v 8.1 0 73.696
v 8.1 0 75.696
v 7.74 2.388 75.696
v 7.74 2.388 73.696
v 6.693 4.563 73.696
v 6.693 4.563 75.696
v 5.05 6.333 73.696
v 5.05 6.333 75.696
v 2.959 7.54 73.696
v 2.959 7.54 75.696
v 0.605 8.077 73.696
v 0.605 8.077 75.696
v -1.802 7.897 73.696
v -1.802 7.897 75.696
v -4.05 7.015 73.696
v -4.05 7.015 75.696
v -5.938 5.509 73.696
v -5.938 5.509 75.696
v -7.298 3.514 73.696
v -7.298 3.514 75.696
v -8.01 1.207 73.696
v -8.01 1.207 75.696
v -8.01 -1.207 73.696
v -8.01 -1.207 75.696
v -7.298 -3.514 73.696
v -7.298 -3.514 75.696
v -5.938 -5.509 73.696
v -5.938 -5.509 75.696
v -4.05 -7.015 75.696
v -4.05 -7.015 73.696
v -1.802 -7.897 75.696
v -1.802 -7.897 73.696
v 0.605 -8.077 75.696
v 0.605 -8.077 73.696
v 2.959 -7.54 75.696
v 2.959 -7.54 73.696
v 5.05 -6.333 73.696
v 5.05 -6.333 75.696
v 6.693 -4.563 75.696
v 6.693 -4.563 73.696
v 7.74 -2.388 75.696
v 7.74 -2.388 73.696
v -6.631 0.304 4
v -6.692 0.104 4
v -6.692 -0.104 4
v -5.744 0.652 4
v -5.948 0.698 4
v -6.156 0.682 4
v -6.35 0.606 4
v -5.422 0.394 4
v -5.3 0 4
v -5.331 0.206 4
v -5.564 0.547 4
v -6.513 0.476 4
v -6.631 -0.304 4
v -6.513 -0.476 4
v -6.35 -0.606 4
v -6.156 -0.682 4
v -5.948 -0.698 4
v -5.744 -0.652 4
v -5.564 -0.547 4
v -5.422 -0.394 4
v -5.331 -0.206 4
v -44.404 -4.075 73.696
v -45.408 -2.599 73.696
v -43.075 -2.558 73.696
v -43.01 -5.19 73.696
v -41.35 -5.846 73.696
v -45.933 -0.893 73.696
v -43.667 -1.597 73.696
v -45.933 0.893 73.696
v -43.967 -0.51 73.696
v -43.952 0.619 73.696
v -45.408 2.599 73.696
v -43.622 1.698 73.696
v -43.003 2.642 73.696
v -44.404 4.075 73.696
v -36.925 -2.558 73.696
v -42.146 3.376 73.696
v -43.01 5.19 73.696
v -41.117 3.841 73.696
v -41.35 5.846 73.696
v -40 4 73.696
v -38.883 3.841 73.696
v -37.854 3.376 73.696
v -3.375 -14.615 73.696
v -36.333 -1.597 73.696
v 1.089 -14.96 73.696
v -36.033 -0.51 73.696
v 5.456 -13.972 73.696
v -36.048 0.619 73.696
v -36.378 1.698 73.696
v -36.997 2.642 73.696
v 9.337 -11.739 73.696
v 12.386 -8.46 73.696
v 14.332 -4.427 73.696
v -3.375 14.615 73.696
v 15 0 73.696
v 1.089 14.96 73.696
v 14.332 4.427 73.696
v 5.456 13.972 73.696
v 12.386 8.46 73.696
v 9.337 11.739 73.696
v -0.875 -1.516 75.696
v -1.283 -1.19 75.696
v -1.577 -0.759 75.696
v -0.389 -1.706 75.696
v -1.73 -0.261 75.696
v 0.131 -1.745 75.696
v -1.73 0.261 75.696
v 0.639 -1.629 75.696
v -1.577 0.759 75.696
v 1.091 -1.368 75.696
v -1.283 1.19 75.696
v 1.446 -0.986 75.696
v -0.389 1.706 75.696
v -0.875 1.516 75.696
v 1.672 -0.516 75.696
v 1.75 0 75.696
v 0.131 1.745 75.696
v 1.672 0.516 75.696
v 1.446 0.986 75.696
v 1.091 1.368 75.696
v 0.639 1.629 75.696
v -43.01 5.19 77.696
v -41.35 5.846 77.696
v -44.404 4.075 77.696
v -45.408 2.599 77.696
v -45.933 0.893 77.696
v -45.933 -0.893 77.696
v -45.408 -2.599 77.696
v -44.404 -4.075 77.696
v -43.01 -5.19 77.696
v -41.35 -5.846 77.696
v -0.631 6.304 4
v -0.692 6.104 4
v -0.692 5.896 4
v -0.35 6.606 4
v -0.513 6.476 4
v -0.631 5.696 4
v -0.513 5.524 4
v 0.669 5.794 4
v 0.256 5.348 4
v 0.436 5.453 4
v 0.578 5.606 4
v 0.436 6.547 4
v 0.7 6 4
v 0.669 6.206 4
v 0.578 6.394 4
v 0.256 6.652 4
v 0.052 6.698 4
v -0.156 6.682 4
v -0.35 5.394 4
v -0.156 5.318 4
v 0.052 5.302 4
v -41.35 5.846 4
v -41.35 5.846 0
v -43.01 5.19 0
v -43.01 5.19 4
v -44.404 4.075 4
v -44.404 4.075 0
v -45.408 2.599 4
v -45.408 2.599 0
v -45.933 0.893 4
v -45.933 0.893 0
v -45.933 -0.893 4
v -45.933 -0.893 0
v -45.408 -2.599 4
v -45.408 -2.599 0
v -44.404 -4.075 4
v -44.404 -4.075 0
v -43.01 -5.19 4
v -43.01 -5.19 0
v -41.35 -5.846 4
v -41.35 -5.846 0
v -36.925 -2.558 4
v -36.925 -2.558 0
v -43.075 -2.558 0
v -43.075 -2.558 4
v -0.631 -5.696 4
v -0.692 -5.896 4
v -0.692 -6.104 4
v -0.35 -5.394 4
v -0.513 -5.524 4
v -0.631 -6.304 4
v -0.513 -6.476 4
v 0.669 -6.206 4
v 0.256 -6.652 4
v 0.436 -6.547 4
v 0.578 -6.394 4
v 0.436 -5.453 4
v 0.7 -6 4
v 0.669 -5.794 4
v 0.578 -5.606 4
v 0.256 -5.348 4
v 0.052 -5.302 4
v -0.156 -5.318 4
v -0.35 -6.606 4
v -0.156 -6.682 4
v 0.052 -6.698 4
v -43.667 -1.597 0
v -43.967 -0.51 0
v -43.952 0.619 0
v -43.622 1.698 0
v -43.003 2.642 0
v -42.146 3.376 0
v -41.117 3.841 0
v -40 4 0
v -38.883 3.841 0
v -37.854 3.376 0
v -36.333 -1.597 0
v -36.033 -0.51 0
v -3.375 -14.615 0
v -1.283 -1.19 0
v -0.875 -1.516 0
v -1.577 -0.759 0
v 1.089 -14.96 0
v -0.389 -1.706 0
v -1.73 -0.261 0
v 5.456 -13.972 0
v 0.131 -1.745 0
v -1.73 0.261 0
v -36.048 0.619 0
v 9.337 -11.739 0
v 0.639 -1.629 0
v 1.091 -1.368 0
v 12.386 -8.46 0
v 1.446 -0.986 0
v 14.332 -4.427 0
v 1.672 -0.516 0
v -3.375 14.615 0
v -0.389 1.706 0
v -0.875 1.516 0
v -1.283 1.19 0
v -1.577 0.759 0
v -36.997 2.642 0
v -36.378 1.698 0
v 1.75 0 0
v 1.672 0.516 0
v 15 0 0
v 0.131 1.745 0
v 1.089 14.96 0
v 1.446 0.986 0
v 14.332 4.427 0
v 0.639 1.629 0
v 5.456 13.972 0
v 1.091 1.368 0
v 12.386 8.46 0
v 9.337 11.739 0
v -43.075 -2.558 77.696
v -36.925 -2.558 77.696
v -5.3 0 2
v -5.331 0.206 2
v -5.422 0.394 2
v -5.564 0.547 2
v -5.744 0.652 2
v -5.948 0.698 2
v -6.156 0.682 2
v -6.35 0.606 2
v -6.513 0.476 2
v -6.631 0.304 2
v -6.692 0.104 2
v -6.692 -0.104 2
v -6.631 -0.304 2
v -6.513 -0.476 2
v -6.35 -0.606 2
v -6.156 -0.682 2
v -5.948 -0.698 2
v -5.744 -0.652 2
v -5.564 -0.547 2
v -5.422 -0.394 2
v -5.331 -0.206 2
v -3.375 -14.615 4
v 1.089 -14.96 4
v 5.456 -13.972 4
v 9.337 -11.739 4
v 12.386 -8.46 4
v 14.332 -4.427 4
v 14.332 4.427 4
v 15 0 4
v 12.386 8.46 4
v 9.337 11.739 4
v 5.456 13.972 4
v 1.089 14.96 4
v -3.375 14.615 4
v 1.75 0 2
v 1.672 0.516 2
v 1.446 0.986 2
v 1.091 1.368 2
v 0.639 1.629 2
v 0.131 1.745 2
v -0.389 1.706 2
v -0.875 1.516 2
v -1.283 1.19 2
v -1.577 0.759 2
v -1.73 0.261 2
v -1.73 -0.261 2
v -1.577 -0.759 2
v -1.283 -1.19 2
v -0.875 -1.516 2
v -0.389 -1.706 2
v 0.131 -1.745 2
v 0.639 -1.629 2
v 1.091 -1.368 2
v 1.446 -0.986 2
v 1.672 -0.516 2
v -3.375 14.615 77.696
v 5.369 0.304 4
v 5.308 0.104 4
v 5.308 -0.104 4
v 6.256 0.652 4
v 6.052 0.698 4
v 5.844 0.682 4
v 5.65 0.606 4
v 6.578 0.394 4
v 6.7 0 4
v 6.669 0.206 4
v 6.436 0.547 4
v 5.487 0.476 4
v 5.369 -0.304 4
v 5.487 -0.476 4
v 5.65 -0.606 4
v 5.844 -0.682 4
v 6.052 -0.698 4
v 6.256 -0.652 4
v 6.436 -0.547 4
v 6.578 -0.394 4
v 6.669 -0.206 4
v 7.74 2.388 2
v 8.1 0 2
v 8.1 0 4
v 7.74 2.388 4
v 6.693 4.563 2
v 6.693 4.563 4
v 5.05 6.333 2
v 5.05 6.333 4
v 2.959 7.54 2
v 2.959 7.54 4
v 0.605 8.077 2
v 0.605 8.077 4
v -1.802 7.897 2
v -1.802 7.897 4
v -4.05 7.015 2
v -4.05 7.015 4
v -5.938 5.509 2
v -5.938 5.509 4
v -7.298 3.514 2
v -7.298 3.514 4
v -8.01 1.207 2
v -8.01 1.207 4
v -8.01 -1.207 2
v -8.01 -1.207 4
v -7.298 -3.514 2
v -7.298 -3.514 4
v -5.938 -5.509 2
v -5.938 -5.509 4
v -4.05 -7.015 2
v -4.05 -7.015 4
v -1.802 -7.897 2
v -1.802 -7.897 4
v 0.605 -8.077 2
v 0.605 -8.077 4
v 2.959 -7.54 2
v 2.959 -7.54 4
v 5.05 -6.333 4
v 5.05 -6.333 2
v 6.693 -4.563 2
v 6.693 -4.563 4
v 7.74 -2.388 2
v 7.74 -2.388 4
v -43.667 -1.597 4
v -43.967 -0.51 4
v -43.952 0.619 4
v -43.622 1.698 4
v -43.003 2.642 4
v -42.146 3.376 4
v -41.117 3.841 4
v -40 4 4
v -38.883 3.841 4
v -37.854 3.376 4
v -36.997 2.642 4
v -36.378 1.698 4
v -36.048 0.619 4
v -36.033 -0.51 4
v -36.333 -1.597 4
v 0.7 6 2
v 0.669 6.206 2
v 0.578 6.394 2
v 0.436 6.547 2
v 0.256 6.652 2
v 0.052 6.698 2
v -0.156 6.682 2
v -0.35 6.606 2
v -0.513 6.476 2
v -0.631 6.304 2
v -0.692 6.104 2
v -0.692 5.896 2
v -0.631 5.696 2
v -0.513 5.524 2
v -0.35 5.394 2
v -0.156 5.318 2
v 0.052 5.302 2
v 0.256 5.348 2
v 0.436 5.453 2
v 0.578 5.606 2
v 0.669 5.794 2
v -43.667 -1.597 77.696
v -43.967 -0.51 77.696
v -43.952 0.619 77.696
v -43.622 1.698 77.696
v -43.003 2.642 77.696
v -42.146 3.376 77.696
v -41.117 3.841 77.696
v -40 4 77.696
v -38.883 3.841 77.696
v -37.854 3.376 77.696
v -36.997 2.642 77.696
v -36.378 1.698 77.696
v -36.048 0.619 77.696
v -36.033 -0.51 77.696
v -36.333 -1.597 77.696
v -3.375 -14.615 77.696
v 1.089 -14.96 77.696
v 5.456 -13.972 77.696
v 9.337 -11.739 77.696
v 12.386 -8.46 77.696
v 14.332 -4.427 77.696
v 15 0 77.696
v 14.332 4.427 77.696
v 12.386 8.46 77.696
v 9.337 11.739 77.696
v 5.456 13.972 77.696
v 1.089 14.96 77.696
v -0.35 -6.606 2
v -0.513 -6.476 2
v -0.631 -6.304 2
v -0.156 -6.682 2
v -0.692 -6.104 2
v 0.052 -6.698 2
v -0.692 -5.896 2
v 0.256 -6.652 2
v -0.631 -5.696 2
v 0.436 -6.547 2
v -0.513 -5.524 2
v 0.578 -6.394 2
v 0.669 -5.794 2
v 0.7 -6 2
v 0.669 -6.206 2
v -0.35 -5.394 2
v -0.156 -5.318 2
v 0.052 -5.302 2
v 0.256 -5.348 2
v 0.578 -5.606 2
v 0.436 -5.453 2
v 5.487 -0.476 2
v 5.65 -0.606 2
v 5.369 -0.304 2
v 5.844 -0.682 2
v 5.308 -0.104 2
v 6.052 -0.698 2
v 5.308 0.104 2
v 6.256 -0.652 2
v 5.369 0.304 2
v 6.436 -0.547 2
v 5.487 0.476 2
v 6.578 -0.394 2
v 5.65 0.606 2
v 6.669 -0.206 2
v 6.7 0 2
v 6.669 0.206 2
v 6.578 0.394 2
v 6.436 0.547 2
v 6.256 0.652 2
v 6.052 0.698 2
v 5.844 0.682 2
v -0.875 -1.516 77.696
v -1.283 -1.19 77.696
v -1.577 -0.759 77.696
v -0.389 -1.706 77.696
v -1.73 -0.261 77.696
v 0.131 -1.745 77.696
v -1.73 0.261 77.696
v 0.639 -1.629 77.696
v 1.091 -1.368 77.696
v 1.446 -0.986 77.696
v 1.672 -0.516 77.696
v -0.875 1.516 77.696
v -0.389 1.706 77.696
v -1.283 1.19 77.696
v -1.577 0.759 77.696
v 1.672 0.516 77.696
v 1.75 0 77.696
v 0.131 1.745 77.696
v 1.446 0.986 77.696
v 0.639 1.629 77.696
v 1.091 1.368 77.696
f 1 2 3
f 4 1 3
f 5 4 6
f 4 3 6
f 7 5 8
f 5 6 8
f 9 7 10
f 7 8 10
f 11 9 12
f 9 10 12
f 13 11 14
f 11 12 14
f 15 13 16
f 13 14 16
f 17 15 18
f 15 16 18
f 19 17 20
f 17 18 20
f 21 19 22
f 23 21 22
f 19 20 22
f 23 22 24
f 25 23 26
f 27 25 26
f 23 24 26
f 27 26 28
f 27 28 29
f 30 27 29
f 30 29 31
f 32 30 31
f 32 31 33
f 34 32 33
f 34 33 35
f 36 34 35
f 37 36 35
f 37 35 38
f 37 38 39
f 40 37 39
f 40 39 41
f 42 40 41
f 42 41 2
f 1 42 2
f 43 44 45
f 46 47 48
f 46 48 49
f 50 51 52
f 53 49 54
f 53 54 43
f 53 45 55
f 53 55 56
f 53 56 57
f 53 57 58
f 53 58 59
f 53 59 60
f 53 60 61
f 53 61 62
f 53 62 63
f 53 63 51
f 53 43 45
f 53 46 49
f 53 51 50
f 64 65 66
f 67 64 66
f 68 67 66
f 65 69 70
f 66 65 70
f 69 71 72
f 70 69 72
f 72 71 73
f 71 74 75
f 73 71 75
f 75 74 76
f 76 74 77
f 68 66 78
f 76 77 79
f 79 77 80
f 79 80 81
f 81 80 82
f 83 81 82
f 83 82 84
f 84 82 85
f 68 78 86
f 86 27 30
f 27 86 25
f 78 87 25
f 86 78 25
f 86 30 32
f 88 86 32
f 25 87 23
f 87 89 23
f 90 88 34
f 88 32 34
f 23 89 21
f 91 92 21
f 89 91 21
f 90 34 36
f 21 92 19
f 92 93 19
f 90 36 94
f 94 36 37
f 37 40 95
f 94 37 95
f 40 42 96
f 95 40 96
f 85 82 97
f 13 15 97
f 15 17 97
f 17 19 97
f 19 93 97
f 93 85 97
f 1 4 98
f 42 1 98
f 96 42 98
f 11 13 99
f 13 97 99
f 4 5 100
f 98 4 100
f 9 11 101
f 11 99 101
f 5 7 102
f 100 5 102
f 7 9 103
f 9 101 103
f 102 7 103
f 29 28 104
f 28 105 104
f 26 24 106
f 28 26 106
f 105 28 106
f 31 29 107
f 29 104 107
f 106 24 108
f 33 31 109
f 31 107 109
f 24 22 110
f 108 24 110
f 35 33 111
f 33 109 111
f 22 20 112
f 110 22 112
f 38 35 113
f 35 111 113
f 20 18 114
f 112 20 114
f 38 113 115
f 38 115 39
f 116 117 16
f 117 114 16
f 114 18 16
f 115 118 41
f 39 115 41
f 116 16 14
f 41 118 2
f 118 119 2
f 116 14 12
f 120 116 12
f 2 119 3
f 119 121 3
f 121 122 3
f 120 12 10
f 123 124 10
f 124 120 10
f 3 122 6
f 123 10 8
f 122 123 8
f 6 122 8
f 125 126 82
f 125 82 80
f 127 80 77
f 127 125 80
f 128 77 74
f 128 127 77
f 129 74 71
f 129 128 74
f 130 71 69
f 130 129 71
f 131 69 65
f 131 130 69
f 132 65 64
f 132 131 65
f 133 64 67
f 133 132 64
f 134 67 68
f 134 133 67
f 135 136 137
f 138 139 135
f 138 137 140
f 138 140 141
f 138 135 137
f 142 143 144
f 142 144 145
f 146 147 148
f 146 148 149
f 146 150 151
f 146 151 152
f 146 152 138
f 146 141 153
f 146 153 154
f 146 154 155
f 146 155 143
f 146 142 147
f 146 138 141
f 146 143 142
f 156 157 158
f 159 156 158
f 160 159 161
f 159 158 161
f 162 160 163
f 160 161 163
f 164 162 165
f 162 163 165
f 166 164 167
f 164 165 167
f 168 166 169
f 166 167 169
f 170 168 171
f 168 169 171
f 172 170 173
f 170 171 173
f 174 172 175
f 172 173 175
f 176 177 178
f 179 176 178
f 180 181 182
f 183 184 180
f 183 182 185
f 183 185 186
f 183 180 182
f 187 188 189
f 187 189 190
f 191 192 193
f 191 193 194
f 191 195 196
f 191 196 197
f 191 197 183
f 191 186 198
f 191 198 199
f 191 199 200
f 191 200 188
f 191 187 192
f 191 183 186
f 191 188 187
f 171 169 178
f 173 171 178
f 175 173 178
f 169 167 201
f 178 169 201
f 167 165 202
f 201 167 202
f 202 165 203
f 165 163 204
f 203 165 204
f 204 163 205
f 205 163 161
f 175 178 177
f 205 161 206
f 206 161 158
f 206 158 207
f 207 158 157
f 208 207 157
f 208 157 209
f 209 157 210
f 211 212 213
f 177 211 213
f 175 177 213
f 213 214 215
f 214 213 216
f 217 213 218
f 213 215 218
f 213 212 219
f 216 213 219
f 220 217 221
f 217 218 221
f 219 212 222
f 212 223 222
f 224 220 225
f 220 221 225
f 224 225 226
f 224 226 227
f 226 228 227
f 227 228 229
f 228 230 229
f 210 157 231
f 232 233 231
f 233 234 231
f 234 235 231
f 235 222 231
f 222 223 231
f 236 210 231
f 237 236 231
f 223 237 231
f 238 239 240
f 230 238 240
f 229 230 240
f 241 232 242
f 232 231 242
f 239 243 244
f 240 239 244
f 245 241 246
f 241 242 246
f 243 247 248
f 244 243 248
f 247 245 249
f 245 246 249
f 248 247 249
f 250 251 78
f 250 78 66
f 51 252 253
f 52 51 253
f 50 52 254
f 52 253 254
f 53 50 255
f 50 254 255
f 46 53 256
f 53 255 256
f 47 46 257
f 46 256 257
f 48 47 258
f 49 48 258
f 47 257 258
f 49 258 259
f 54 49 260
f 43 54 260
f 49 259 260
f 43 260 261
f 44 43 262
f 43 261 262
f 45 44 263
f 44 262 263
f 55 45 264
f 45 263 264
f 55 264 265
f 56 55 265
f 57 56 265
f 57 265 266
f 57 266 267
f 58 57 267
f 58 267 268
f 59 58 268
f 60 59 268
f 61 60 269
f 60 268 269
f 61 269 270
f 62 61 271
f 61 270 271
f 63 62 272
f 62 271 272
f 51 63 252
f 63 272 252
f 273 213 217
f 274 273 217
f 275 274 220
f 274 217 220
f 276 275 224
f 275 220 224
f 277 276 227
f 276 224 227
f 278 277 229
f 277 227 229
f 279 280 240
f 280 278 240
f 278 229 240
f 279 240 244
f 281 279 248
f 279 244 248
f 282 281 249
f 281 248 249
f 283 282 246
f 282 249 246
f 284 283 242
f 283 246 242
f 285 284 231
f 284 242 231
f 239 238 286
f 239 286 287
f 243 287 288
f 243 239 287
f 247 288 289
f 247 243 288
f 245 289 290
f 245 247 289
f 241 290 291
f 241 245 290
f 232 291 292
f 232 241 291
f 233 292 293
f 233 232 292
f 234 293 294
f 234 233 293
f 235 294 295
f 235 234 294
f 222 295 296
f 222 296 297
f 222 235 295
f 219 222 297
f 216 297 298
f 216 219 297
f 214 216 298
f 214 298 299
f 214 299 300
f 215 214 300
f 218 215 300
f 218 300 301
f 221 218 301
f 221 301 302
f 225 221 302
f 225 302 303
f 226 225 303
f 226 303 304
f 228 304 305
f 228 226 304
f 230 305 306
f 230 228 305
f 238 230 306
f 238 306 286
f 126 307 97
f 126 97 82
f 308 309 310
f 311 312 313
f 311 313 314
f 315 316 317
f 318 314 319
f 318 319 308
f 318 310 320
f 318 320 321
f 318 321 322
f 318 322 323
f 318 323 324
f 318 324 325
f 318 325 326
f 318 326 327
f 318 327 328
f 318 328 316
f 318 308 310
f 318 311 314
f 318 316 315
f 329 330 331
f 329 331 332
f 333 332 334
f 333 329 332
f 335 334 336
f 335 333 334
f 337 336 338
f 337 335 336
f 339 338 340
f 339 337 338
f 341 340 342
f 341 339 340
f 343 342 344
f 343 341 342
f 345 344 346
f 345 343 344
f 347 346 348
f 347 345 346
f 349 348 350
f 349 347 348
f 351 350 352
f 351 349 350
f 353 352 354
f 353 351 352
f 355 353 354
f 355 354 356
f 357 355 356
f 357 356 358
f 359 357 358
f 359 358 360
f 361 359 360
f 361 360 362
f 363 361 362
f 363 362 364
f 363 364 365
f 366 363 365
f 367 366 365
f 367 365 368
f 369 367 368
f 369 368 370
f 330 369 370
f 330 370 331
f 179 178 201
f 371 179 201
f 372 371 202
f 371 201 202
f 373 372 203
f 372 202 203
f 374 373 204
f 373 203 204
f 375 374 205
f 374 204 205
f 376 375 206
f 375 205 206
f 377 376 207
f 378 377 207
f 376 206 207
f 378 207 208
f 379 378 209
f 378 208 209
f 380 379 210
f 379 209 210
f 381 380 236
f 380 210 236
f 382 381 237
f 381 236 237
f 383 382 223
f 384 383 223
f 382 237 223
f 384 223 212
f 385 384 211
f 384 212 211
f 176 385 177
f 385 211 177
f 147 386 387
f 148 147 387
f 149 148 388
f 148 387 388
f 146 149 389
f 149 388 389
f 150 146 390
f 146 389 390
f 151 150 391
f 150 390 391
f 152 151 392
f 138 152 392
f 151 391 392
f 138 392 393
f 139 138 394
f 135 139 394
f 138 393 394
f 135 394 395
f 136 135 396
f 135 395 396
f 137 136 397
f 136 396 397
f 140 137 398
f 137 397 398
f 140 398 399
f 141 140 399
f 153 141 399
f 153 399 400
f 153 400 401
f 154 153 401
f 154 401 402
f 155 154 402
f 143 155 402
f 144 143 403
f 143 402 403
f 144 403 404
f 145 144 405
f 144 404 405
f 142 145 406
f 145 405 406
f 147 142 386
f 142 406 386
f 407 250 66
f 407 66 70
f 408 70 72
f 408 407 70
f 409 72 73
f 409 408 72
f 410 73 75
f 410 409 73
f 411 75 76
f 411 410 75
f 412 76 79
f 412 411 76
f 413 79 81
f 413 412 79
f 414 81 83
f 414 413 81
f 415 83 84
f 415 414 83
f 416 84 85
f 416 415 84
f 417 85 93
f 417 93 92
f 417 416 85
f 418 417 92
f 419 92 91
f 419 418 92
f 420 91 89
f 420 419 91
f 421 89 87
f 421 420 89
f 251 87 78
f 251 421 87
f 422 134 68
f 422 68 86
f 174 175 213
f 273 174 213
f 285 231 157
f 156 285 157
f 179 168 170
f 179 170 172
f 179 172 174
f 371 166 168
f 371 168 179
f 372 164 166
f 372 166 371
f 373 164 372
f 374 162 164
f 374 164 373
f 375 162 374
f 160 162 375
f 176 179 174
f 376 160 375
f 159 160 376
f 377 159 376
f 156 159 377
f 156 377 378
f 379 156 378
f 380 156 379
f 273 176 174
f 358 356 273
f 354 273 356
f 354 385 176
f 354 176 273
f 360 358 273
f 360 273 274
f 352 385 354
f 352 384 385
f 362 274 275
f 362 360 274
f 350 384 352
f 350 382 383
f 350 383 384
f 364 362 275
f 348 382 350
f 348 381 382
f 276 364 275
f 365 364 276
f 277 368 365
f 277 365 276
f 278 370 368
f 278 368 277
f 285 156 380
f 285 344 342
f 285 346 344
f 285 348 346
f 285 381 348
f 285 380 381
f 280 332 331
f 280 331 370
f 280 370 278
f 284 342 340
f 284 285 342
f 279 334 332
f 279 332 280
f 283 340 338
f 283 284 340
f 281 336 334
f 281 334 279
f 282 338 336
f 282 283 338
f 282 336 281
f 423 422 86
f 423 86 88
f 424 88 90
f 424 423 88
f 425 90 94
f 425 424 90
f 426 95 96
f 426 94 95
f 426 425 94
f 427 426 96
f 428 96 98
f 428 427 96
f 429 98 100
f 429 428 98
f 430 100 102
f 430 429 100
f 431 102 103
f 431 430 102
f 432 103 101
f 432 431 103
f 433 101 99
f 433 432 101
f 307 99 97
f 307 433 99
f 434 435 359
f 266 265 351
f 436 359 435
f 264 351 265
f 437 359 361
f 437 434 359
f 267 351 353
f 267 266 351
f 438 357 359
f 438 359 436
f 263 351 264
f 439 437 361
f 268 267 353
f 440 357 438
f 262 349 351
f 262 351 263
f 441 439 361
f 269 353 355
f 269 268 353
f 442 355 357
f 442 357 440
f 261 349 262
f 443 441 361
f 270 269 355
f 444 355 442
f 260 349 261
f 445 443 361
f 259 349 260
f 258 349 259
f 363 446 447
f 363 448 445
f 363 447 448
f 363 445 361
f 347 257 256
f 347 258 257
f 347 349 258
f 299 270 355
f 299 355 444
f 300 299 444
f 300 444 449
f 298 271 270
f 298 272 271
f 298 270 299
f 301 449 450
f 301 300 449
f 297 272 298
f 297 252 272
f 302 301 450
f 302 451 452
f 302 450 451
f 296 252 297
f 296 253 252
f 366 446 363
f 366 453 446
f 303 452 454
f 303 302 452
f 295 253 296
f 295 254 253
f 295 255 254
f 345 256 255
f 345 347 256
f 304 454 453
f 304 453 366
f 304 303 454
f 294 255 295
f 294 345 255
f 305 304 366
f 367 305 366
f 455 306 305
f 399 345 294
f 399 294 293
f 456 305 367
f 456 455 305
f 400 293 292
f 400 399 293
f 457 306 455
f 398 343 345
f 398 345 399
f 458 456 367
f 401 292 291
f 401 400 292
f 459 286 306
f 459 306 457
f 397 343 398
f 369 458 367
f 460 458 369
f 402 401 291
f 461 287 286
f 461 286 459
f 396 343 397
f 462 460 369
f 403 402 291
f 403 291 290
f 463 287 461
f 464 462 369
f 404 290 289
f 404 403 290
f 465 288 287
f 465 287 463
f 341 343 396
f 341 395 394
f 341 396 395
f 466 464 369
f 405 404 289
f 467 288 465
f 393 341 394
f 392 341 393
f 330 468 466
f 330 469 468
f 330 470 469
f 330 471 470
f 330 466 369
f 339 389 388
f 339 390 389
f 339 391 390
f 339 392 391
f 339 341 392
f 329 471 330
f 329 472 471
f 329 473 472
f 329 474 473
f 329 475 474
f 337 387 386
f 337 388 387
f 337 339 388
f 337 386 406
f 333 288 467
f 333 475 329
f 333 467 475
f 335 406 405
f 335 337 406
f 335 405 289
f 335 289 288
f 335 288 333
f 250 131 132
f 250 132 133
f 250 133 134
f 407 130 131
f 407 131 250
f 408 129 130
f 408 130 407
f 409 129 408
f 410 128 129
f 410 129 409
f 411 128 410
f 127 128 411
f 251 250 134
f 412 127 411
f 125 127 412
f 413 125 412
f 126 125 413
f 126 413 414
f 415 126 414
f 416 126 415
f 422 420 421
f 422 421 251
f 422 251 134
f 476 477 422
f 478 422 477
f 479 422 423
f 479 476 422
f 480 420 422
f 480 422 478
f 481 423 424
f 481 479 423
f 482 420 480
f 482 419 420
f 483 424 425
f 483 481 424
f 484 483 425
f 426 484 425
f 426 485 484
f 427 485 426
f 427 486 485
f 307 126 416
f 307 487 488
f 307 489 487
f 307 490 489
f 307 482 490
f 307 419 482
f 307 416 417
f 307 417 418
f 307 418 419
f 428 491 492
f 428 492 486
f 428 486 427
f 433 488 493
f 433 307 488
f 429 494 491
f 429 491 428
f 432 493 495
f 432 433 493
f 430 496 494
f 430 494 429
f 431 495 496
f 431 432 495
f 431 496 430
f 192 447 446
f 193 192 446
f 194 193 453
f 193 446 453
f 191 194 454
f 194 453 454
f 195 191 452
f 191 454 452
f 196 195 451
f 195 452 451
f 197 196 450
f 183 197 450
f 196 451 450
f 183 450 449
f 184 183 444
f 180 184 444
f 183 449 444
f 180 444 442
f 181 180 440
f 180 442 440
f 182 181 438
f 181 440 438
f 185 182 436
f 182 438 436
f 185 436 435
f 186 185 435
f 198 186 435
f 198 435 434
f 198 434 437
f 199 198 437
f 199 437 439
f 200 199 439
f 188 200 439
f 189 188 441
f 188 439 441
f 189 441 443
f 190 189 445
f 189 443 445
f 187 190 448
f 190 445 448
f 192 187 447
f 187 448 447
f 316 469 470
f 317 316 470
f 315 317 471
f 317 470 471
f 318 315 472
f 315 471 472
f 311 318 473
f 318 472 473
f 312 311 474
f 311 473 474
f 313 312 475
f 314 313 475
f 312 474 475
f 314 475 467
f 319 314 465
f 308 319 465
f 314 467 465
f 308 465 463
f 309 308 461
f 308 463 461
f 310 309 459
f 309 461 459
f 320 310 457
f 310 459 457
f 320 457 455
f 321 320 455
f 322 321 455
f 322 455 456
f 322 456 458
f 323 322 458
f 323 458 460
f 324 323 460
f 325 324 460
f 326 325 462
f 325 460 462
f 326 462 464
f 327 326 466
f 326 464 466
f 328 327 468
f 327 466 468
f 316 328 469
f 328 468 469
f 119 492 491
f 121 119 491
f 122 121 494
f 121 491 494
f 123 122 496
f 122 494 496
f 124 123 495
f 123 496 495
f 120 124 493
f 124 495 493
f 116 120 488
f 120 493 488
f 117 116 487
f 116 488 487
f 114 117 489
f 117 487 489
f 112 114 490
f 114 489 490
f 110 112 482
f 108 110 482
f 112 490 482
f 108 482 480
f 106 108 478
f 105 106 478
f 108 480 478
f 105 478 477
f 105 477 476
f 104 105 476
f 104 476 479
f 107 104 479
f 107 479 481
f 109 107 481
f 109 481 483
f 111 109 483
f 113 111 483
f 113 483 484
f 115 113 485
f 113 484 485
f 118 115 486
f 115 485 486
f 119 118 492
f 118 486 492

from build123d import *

# Parameters (mm, degrees)
SKETCH1_R           = 15
SKETCH1_R_2         = 8.1
BOSS_EXTRUDE1_DEPTH = 4
SKETCH1_3_R         = 8.1
SKETCH1_3_R_2       = 1.75
BOSS_EXTRUDE2_DEPTH = 2
BOSS_EXTRUDE3_DEPTH = 4
SKETCH3_R           = 0.7
BOSS_EXTRUDE4_DEPTH = 2


with BuildPart() as part:
    # Sketch1 → Boss-Extrude1 (new body)
    with BuildSketch(Plane.XY):
        Circle(SKETCH1_R)
        Circle(SKETCH1_R_2, mode=Mode.SUBTRACT)
    extrude(amount=BOSS_EXTRUDE1_DEPTH)

    # Sketch1<3> → Boss-Extrude2 (add)
    with BuildSketch(Plane.XY):
        Circle(SKETCH1_3_R)
        Circle(SKETCH1_3_R_2, mode=Mode.SUBTRACT)
    extrude(amount=BOSS_EXTRUDE2_DEPTH)

    # Sketch2 → Boss-Extrude3 (add)
    with BuildSketch(Plane.XY):
        with BuildLine():
            Line((-3.375, 14.615381452), (-41.35, 5.846152581))
            ThreePointArc((-41.35, 5.846152581), (-46, 0), (-41.35, -5.846152581))
            Line((-41.35, -5.846152581), (-3.375, -14.615381452))
            ThreePointArc((-3.375, -14.615381452), (-15, 0), (-3.375, 14.615381452))
        make_face()
        with BuildLine():
            Line((-36.925, -2.558197608), (-43.075, -2.558197608))
            ThreePointArc((-43.075, -2.558197608), (-40, 4), (-36.925, -2.558197608))
        make_face(mode=Mode.SUBTRACT)
    extrude(amount=BOSS_EXTRUDE3_DEPTH)


with BuildPart() as body_2:
    # Mirror2: mirrored copy
    add(part.part.mirror(Plane.XY.offset(38.847994838)))


with BuildPart() as part_1:
    add(part.part)

    # Sketch3 → Boss-Extrude4 (add)
    with BuildSketch(Plane.XY.offset(2)):
        with Locations((0, 6)):
            Circle(SKETCH3_R)
        with Locations((6, 0)):
            Circle(SKETCH3_R)
        with Locations((0, -6)):
            Circle(SKETCH3_R)
        with Locations((-6, 0)):
            Circle(SKETCH3_R)
    extrude(amount=BOSS_EXTRUDE4_DEPTH)


solid = Compound([body_2.part, part_1.part])
